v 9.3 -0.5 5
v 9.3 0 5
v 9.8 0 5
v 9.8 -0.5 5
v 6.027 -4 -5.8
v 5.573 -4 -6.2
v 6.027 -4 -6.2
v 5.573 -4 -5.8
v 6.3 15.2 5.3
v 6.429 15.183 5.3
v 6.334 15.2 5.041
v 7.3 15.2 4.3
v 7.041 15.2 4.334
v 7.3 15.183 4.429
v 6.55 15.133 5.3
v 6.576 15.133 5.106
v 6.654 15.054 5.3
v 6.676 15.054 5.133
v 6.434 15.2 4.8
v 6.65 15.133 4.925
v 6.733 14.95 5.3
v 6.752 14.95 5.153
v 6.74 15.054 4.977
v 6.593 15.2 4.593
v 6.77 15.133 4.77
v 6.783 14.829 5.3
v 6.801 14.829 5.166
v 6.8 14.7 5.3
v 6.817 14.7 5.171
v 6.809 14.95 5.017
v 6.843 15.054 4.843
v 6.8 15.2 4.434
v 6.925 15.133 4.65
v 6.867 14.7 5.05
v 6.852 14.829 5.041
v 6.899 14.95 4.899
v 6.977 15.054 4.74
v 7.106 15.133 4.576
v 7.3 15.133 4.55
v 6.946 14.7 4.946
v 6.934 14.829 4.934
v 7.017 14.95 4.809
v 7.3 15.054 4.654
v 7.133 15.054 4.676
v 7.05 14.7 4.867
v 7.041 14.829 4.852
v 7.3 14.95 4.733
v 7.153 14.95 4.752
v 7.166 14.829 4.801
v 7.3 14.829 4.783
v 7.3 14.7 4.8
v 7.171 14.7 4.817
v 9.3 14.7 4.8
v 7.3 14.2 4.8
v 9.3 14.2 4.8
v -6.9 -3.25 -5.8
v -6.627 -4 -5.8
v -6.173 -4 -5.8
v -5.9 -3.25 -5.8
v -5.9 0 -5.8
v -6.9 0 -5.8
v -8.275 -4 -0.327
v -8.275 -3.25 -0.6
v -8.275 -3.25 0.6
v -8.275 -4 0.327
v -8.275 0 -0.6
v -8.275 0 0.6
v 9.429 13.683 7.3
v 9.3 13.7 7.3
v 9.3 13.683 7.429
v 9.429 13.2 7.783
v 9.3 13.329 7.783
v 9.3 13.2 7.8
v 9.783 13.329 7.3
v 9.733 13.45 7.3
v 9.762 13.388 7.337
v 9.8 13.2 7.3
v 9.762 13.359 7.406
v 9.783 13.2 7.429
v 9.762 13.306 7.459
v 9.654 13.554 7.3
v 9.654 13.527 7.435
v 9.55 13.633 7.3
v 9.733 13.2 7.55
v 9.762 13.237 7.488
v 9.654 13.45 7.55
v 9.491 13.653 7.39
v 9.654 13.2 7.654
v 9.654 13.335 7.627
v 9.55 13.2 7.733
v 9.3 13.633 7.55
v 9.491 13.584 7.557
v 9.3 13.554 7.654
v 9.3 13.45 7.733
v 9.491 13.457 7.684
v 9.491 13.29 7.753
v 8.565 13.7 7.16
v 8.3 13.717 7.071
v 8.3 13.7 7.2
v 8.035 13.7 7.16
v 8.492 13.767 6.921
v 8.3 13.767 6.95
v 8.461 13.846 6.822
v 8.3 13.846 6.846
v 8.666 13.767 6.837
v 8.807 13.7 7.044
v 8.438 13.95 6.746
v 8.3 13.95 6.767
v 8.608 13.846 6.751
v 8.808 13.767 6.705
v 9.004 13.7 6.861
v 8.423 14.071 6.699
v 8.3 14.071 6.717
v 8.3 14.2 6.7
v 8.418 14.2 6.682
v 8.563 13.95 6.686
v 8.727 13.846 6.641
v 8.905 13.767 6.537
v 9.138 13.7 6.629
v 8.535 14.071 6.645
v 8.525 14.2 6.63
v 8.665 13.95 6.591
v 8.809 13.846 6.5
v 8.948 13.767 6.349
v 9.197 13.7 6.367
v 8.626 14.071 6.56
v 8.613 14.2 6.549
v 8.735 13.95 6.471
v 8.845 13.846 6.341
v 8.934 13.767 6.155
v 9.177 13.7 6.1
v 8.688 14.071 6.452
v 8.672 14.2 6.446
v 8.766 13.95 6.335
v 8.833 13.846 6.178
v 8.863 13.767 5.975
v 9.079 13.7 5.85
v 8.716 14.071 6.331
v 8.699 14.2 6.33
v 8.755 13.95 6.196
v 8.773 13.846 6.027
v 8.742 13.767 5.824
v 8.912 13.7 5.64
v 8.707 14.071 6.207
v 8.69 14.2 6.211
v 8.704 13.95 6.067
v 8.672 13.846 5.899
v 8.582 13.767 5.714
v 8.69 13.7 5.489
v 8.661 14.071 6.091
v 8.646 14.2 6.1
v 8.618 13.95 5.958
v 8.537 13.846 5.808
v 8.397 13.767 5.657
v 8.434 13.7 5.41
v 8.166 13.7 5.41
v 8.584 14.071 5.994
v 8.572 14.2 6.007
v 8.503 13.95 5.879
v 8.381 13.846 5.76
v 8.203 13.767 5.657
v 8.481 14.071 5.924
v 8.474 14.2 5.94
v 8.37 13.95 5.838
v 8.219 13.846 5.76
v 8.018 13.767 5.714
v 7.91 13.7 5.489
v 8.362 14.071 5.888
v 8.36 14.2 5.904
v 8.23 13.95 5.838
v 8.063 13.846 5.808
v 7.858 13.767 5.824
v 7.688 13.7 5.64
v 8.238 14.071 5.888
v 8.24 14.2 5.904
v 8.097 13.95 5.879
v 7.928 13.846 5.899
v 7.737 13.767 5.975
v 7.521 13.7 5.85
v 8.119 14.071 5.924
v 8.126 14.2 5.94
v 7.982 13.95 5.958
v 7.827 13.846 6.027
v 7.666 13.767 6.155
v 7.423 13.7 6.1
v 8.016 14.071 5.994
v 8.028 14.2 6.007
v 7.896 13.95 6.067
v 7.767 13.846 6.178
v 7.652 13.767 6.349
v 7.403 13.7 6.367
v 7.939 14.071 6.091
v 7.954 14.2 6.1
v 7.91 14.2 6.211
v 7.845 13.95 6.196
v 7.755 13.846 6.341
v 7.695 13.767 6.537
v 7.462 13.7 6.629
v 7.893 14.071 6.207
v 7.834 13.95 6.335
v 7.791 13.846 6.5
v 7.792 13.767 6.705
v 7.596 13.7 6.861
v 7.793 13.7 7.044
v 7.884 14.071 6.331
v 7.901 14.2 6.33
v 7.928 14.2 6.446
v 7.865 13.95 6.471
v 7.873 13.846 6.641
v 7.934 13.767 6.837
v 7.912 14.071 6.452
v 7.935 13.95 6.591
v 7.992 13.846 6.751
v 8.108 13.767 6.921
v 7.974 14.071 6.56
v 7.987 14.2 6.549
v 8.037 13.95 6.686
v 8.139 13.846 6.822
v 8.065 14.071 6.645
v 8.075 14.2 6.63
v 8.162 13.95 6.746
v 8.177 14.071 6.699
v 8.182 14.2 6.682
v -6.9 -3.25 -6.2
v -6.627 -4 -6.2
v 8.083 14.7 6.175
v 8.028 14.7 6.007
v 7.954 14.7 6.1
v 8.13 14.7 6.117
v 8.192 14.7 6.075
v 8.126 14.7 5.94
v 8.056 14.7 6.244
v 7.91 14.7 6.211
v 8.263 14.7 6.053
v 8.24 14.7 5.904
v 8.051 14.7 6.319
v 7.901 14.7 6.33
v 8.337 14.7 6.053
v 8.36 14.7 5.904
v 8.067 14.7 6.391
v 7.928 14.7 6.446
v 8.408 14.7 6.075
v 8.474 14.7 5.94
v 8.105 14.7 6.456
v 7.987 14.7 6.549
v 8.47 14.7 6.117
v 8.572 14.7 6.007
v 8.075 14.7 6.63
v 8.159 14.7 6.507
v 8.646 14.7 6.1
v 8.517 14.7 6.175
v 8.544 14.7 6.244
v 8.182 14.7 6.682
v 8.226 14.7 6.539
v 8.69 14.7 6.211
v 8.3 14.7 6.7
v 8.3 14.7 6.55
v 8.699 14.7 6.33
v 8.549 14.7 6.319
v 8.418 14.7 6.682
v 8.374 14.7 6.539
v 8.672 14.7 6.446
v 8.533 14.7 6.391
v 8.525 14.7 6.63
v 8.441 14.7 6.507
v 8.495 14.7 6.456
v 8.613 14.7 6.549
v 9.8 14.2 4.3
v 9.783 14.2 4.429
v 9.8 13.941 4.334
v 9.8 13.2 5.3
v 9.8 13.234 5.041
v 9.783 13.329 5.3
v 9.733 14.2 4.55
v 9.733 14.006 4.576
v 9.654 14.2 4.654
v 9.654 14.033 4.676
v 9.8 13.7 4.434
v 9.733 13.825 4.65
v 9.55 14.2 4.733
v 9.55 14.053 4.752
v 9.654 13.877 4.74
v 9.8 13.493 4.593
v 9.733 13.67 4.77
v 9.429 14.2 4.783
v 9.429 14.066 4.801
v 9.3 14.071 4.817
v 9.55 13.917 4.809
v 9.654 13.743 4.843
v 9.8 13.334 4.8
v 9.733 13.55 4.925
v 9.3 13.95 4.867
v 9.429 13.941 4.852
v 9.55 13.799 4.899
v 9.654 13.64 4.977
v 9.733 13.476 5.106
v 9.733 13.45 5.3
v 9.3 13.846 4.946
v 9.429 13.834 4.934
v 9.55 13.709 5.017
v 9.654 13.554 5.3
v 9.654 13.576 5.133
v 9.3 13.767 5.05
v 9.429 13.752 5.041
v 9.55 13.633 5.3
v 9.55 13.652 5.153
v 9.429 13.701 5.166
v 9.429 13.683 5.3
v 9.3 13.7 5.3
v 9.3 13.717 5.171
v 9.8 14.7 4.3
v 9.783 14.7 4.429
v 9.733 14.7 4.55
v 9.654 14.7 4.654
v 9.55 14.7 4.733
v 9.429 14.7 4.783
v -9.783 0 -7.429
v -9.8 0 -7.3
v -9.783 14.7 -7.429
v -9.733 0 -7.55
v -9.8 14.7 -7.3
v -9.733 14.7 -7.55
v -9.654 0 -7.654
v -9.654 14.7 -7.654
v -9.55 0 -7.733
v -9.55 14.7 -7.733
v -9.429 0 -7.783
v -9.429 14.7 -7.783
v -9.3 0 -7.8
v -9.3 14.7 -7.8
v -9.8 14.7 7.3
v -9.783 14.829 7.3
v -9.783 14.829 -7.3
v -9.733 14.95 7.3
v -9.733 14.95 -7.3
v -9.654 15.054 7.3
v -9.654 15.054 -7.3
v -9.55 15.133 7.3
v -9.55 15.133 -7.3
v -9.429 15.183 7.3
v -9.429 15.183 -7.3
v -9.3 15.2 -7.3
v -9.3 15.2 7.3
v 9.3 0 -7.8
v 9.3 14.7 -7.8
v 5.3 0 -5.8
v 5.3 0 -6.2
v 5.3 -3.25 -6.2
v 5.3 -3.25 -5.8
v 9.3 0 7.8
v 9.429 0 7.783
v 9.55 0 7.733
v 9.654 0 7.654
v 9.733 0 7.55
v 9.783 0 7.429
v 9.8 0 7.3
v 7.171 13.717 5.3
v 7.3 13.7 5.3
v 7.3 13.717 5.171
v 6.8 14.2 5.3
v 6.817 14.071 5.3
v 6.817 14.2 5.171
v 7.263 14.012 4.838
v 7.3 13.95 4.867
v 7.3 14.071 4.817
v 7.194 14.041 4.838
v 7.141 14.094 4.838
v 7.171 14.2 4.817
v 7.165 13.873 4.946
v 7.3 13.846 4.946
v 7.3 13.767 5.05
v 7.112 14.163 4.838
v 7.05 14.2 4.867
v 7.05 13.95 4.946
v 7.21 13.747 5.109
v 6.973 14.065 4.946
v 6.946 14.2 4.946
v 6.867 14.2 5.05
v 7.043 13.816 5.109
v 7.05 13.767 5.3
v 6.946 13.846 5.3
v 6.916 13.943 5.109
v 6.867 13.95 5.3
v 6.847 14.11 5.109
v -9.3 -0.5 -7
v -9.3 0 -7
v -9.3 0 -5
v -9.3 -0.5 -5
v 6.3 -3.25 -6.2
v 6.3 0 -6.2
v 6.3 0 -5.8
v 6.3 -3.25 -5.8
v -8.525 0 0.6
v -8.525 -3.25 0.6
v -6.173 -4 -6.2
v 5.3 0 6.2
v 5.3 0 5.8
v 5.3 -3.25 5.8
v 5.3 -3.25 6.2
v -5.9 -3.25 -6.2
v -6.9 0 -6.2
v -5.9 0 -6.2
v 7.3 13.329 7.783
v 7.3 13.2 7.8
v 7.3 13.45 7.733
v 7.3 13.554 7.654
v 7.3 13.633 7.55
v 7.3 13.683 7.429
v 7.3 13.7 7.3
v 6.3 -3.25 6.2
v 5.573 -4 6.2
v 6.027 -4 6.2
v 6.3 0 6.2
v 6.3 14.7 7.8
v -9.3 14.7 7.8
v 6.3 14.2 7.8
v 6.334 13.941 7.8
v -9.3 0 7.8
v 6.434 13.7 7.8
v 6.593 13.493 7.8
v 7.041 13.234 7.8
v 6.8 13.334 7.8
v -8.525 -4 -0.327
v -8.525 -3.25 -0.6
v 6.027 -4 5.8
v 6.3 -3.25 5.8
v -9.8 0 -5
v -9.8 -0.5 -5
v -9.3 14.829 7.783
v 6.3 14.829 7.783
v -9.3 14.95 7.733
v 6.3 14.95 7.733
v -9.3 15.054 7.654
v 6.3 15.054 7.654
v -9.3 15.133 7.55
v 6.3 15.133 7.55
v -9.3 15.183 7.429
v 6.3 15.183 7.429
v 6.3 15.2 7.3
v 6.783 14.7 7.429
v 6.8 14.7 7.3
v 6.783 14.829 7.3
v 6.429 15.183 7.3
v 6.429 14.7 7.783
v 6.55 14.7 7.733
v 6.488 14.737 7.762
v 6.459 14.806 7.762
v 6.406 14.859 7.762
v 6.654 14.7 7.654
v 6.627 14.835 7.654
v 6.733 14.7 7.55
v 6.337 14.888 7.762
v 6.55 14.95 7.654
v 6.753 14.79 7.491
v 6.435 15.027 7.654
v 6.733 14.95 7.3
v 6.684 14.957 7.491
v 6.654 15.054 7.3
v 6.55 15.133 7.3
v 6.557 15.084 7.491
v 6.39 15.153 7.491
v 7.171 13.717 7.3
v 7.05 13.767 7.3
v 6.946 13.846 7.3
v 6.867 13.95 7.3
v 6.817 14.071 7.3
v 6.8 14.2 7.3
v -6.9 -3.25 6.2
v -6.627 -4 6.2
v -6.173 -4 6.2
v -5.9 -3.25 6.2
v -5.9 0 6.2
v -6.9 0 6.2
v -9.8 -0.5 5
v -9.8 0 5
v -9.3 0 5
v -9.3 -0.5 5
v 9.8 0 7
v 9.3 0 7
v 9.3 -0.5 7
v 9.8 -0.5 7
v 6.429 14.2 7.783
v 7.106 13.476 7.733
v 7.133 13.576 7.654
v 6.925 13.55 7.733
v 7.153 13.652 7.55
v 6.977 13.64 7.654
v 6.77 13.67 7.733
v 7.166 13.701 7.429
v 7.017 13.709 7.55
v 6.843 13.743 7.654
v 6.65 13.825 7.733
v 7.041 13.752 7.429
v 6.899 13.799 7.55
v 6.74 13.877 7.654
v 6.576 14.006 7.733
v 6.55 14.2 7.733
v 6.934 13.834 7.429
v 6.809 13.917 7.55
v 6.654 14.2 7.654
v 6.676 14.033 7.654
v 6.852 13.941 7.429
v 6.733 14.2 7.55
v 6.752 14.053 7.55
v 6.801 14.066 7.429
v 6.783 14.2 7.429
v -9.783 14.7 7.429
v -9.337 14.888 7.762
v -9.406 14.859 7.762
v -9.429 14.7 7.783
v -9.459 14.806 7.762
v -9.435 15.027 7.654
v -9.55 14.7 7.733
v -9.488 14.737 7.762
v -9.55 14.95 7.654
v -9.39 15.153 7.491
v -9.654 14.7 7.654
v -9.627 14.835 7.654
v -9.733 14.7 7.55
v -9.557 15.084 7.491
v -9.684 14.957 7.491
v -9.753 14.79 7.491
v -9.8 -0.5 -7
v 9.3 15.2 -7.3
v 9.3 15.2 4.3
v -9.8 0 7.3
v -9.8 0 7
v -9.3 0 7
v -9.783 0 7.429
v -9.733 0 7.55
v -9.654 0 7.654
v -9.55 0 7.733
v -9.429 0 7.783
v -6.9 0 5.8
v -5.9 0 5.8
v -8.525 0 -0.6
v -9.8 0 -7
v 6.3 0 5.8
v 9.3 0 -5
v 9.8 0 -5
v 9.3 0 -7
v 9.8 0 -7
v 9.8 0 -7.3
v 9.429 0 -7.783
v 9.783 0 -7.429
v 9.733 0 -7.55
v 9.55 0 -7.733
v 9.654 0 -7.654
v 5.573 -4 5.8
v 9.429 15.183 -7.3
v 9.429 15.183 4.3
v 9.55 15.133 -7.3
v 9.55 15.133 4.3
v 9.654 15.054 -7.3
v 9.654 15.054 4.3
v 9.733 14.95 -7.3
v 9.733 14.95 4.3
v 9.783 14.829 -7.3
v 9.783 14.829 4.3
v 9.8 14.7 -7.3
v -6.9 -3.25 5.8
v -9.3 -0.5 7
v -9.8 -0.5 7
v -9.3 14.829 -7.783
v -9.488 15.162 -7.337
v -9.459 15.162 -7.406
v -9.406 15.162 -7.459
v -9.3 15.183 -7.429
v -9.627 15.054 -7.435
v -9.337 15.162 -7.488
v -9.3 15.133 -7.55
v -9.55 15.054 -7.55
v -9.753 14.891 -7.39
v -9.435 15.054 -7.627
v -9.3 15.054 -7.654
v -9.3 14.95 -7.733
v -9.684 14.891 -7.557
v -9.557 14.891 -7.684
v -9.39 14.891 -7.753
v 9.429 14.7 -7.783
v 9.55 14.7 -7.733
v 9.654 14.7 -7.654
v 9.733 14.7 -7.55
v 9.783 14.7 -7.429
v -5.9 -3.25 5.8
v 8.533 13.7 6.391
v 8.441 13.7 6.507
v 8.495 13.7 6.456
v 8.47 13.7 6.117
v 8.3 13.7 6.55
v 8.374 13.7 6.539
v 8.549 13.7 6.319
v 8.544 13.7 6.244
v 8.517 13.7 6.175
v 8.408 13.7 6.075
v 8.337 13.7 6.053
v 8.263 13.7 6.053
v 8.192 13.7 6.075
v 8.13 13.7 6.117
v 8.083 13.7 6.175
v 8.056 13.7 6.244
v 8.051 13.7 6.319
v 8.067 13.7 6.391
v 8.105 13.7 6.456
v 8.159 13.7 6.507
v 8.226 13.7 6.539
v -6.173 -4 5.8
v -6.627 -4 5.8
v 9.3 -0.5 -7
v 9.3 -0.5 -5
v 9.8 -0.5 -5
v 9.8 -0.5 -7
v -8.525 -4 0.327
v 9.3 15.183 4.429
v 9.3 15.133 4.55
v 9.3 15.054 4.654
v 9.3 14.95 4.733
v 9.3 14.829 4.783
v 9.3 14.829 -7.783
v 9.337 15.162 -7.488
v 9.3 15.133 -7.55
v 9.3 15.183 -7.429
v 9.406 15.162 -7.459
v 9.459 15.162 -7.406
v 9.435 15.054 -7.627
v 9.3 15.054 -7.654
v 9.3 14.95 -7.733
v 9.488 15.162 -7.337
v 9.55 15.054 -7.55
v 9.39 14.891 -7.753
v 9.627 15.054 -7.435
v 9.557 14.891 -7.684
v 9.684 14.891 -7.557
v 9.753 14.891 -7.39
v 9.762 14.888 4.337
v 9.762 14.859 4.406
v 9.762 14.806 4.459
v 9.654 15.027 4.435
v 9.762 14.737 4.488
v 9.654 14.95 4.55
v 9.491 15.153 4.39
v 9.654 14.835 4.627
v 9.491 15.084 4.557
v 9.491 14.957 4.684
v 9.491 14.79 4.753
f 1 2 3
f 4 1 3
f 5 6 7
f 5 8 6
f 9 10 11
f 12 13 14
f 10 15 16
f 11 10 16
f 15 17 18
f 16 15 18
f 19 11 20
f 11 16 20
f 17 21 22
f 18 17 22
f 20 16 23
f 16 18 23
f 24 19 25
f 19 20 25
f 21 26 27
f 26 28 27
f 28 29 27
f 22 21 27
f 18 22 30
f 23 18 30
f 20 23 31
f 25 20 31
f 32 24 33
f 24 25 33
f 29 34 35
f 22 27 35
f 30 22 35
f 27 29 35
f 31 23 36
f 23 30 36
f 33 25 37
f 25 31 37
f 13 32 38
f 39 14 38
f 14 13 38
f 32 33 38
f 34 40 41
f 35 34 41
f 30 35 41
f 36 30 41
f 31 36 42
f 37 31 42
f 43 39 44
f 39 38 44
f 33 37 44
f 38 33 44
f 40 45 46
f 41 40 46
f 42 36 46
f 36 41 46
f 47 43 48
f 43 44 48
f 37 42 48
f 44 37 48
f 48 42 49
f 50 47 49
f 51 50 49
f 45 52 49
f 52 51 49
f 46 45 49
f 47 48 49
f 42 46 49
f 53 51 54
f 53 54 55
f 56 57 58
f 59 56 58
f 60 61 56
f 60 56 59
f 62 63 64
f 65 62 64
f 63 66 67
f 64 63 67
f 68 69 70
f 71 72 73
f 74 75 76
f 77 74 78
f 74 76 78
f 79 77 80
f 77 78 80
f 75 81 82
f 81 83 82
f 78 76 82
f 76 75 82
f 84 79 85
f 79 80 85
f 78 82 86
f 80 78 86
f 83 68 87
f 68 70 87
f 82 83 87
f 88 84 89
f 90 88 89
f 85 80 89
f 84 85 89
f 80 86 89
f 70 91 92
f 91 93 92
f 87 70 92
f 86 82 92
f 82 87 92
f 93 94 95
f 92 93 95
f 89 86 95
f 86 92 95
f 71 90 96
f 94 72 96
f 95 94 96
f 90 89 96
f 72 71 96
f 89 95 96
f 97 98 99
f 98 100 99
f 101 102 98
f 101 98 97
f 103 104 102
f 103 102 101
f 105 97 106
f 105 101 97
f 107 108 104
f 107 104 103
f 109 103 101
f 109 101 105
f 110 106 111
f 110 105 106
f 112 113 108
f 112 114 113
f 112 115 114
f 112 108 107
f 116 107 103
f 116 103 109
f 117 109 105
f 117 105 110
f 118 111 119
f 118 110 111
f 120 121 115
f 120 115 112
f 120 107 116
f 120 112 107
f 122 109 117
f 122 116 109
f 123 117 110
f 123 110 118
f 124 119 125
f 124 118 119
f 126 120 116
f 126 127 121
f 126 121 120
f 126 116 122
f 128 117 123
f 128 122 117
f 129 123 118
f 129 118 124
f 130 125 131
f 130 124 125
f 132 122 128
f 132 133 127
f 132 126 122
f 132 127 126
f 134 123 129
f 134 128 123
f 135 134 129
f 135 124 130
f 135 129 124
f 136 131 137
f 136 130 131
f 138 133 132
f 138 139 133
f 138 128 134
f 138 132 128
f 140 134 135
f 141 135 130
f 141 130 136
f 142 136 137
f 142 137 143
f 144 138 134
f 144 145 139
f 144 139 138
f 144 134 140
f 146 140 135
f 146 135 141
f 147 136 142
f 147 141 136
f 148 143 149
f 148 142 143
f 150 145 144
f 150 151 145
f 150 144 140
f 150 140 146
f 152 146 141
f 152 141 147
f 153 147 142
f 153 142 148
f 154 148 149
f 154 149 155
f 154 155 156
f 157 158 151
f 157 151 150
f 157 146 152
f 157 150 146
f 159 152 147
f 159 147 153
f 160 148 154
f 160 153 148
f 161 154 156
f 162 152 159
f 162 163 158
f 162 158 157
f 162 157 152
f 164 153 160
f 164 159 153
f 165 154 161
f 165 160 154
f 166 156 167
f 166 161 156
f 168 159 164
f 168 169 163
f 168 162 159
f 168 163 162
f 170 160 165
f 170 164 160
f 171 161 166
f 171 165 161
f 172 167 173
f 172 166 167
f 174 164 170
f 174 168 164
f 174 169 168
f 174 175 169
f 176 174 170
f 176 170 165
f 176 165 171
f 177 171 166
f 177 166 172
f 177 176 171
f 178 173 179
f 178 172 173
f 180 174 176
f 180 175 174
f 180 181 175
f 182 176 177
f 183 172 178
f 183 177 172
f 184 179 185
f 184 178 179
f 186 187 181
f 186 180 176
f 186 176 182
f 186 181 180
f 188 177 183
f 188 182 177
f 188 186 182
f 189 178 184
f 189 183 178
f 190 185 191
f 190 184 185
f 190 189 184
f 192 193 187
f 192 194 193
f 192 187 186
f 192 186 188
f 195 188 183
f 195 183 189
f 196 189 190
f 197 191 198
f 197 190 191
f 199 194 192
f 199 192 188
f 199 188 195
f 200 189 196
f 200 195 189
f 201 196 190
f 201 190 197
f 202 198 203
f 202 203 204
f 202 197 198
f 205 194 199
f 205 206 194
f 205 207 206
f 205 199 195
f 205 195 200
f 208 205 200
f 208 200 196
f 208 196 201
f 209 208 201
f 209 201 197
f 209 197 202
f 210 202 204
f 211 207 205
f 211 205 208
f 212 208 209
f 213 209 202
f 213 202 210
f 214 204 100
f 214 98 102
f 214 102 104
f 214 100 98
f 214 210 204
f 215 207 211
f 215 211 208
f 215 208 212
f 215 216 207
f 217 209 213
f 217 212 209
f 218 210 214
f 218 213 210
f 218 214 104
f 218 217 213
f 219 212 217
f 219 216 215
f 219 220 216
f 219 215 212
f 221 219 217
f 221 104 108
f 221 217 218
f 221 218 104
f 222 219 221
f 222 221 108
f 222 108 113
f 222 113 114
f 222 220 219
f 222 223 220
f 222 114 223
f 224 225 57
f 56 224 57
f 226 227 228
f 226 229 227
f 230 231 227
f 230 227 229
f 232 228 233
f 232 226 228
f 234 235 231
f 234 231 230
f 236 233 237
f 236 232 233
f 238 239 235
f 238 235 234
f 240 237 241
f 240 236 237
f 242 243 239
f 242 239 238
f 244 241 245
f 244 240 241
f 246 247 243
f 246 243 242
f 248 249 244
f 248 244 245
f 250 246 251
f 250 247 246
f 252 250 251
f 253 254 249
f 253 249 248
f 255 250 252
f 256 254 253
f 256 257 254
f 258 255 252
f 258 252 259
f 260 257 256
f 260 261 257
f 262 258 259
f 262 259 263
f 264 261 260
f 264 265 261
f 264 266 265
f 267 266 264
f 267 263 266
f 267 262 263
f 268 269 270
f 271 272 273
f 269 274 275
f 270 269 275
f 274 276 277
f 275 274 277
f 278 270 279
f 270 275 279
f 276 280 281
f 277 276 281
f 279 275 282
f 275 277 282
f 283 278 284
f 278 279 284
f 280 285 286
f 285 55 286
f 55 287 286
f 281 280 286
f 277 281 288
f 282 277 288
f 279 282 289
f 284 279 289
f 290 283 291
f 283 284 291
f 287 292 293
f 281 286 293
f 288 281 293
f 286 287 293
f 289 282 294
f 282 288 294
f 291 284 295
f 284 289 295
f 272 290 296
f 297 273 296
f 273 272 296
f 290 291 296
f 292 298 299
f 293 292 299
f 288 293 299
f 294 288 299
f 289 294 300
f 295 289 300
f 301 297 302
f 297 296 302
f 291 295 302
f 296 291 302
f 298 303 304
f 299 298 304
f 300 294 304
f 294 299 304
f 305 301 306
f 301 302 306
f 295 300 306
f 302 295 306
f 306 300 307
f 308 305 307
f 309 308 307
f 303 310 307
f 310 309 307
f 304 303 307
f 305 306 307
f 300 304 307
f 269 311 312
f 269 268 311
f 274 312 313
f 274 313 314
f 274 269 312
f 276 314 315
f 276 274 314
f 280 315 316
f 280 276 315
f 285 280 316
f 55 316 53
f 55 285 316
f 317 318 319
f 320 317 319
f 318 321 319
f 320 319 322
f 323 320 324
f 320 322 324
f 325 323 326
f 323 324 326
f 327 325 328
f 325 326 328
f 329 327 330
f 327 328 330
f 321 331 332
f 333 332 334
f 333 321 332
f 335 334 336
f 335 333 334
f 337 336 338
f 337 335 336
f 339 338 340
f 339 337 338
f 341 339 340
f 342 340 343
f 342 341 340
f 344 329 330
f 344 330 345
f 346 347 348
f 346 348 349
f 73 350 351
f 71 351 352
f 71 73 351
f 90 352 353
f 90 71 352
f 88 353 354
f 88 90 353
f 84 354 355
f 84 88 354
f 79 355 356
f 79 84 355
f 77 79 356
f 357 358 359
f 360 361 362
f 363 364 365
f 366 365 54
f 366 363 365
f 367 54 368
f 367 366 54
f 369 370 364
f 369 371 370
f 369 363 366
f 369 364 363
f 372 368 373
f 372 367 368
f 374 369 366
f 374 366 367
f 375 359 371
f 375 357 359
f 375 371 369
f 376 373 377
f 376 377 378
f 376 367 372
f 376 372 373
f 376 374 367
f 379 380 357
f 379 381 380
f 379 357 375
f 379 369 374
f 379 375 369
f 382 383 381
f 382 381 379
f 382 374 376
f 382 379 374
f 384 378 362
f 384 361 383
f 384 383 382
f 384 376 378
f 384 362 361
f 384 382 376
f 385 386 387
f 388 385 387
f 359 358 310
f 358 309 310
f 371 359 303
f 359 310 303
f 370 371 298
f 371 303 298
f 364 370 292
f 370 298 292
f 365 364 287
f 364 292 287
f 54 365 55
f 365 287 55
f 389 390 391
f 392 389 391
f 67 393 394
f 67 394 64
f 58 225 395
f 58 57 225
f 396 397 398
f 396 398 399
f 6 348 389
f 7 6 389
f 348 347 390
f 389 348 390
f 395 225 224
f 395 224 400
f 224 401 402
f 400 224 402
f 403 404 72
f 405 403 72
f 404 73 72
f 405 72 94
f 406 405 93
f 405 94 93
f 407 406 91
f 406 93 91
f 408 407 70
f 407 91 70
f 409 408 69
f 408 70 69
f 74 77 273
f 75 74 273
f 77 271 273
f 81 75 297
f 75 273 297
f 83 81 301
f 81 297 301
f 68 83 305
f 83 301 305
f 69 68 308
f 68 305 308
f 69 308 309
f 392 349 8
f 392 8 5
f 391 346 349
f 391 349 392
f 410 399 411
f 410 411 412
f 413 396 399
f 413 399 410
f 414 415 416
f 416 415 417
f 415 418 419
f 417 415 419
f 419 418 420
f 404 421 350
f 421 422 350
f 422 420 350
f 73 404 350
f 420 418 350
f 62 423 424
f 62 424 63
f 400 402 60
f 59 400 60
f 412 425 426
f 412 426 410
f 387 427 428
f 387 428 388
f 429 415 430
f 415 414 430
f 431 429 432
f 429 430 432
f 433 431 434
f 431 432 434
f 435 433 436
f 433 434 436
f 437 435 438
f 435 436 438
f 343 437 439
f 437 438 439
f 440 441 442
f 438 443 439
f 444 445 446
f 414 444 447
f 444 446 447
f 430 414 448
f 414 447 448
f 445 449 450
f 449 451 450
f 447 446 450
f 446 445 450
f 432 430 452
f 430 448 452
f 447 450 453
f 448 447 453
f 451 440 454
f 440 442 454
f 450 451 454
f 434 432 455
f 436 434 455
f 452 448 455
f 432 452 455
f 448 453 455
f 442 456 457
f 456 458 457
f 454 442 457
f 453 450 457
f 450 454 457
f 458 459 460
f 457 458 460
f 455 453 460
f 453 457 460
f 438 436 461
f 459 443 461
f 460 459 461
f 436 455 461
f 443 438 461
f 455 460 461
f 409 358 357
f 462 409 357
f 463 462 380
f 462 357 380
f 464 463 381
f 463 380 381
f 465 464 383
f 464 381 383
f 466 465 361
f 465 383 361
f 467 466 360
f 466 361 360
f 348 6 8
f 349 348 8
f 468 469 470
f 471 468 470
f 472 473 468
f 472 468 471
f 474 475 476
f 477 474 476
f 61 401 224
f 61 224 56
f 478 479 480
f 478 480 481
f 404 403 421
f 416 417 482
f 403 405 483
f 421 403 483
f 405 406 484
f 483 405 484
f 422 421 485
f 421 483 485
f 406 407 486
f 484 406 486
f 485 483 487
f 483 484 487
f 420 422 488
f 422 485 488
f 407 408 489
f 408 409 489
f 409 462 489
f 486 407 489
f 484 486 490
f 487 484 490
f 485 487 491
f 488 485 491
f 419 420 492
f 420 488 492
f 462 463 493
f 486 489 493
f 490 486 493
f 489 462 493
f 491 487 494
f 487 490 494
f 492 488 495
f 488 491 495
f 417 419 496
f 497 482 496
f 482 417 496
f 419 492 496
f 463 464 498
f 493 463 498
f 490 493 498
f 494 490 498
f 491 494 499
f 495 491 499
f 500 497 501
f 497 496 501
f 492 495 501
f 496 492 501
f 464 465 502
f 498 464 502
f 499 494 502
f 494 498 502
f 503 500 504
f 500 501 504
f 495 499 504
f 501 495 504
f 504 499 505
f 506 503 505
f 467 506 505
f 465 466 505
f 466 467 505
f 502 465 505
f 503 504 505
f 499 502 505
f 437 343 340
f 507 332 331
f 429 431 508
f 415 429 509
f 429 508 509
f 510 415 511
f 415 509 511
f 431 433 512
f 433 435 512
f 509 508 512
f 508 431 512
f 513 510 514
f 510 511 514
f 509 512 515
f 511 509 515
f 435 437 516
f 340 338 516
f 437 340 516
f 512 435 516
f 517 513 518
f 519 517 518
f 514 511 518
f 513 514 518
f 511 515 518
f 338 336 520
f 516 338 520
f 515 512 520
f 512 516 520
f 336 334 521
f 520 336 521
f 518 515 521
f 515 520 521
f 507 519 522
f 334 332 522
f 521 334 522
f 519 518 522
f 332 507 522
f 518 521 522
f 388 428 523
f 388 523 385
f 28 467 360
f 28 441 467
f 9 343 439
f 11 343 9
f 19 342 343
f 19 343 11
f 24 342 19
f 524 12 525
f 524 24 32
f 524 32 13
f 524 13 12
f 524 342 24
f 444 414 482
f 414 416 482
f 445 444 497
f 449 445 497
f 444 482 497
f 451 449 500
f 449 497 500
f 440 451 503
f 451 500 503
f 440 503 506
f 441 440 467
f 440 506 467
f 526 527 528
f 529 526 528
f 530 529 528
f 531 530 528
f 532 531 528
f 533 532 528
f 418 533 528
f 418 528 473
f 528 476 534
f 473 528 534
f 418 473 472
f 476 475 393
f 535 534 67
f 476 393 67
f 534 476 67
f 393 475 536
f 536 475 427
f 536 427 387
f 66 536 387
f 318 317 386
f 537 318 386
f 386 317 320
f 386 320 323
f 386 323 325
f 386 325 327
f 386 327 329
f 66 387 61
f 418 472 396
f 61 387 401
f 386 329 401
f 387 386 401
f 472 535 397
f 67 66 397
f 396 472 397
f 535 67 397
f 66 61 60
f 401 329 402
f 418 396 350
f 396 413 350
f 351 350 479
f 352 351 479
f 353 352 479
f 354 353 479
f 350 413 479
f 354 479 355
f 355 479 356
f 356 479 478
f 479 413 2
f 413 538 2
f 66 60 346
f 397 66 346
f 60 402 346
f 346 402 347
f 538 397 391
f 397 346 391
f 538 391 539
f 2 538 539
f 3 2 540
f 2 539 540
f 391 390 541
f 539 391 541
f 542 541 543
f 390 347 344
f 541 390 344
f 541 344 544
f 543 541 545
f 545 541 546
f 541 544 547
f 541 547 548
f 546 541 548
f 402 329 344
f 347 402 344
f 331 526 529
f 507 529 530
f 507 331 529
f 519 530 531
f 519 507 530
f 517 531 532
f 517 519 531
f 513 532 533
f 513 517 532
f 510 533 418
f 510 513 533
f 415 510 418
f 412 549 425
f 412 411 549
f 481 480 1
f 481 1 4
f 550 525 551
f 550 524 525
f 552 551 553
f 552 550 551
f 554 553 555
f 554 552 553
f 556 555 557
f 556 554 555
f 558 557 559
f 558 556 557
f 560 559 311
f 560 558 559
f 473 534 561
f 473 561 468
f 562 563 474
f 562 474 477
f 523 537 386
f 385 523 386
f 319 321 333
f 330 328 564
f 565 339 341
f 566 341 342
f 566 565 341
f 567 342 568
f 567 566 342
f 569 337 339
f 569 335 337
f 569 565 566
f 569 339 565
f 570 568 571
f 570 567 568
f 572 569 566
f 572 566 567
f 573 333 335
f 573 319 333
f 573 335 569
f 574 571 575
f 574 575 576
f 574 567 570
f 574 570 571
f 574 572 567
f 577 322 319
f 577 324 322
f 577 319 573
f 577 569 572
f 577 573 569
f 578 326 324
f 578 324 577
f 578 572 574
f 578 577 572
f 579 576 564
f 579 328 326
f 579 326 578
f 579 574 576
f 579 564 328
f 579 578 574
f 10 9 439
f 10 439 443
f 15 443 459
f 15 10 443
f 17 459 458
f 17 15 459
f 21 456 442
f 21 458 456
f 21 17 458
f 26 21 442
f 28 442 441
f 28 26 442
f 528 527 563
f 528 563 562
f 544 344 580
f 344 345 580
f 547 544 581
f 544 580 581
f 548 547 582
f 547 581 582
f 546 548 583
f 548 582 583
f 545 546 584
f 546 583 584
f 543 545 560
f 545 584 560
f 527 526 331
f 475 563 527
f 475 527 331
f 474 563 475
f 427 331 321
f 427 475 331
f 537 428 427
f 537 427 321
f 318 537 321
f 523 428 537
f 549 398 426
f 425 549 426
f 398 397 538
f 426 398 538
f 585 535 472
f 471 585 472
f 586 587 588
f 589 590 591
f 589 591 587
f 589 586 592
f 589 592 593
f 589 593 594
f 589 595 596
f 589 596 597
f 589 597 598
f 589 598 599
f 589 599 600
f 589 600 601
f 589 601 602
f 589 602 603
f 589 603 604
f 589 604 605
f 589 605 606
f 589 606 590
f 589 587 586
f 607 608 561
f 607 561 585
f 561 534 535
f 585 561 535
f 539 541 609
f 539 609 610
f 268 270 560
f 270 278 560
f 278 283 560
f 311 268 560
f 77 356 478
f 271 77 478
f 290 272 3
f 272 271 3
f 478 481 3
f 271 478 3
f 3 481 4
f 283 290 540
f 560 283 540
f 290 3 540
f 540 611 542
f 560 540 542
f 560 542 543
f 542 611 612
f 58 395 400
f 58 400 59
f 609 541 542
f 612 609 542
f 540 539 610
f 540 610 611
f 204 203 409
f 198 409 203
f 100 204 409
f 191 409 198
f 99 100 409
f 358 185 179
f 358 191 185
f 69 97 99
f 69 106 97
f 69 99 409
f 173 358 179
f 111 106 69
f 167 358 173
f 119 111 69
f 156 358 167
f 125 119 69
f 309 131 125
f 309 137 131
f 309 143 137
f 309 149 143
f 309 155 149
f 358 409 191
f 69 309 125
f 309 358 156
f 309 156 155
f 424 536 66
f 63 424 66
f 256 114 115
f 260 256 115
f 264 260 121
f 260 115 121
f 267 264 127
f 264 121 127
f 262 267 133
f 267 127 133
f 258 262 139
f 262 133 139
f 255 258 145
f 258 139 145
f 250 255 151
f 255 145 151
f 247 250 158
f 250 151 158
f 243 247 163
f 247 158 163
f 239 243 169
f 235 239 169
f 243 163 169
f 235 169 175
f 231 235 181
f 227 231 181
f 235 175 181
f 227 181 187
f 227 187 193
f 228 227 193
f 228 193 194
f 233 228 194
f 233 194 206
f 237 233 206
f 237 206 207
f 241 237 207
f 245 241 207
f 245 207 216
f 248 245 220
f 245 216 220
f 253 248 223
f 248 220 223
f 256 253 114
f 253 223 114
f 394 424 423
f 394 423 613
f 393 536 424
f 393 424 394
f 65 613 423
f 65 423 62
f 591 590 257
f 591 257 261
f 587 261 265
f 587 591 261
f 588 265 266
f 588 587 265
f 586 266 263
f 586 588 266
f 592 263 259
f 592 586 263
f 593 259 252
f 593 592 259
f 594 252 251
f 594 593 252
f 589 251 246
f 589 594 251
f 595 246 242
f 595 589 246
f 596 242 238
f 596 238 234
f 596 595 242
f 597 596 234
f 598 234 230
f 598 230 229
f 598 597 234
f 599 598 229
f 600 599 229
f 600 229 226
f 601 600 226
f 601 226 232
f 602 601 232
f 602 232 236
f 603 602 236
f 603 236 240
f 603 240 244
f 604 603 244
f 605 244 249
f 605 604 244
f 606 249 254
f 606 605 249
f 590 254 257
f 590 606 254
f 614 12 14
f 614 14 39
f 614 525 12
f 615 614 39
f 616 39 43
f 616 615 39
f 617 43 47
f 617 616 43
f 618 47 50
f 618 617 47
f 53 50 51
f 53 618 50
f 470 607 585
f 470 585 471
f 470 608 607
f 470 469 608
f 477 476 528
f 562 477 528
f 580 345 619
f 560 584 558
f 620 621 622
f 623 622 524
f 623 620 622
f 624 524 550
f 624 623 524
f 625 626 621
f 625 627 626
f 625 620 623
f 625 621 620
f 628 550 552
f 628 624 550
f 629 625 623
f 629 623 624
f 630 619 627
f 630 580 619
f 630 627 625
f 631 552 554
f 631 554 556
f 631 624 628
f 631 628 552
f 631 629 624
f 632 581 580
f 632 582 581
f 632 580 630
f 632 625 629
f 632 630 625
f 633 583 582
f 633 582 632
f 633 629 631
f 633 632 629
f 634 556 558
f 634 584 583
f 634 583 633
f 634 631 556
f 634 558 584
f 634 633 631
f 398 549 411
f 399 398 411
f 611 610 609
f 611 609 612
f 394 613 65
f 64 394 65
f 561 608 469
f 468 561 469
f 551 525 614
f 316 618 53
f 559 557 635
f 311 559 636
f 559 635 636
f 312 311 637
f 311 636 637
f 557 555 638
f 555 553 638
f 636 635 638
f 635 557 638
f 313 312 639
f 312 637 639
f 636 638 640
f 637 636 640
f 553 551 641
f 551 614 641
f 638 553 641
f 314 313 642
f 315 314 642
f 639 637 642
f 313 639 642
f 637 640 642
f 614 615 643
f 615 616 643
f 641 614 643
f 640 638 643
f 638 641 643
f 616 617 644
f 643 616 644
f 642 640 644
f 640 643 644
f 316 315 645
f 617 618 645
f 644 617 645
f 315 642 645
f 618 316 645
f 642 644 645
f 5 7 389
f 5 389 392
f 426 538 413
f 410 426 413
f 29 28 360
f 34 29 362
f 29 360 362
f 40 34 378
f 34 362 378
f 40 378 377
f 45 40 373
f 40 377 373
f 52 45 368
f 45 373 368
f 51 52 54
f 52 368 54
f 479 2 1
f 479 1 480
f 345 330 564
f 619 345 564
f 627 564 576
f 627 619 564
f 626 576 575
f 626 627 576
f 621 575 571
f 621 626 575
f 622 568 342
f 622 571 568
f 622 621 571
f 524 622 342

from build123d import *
from OCP.BRepFilletAPI import BRepFilletAPI_MakeChamfer

# Parameters (mm, degrees)
SKETCH_1_W          = 19.6
SKETCH_1_H          = 15.6
EXTRUDE_1_DEPTH     = 15.2
SKETCH_2_W          = 3
SKETCH_2_H          = 3
CUT_EXTRUDE_1_DEPTH = 1.5
SKETCH_3_R          = 0.4
SKETCH_3_R_2        = 0.25
EXTRUDE_2_DEPTH     = 1
SKETCH_5_W          = 0.5
SKETCH_5_H          = 2
EXTRUDE_4_DEPTH     = 0.5
FILLET_1_R          = 0.5
SKETCH_4_W          = 0.25
SKETCH_4_H          = 1.2
SKETCH_4_W_2        = 1
SKETCH_4_H_2        = 0.4
EXTRUDE_3_DEPTH     = 4
CHAMFER_1_SIZE      = 0.75
CHAMFER_1_SIZE2     = 0.272977676


with BuildPart() as part:
    # Эскиз1 → Бобышка-Вытянуть1 (new body)
    with BuildSketch(Plane(origin=(0, 0, 0), x_dir=(1, 0, 0), z_dir=(0, 1, 0))):
        Rectangle(SKETCH_1_W, SKETCH_1_H)
    extrude(amount=EXTRUDE_1_DEPTH)

    # Эскиз2 → Вырез-Вытянуть1 (cut)
    with BuildSketch(Plane(origin=(0, 15.2, 0), x_dir=(1, 0, 0), z_dir=(0, 1, 0))):
        with Locations((8.3, -6.3)):
            Rectangle(SKETCH_2_W, SKETCH_2_H)
    extrude(amount=-CUT_EXTRUDE_1_DEPTH, mode=Mode.SUBTRACT)

    # Эскиз3 → Бобышка-Вытянуть2 (add)
    with BuildSketch(Plane(origin=(0, 13.7, 0), x_dir=(1, 0, 0), z_dir=(0, 1, 0))):
        with Locations(Location((8.3, -6.3, 0), (0, 0, 270))):
            Circle(SKETCH_3_R)
        with Locations(Location((8.3, -6.3, 0), (0, 0, 270))):
            Circle(SKETCH_3_R_2, mode=Mode.SUBTRACT)
    extrude(amount=EXTRUDE_2_DEPTH)

    # Эскиз5 → Бобышка-Вытянуть4 (add)
    with BuildSketch(Plane.XZ):
        with Locations((-9.55, 6)):
            Rectangle(SKETCH_5_W, SKETCH_5_H)
        with Locations((-9.55, -6)):
            Rectangle(SKETCH_5_W, SKETCH_5_H)
        with Locations((9.55, -6)):
            Rectangle(SKETCH_5_W, SKETCH_5_H)
        with Locations((9.55, 6)):
            Rectangle(SKETCH_5_W, SKETCH_5_H)
    extrude(amount=EXTRUDE_4_DEPTH)

    # Скругление1
    fillet_1_edges = [part.edges().sort_by_distance(p)[0] for p in [
        (8.3, 15.2, 4.8),
        (-9.8, 7.6, -7.8),
        (-9.8, 15.2, 0),
        (9.8, 7.6, -7.8),
        (0, 15.2, -7.8),
        (9.8, 15.2, -1.5),
        (8.3, 13.7, 5.9),
        (6.8, 13.7, 6.3),
        (8.3, 13.7, 4.8),
        (9.8, 14.45, 4.8),
        (8.3, 13.7, 7.8),
        (9.8, 13.7, 6.3),
        (6.8, 14.45, 4.8),
        (6.8, 15.2, 6.3),
        (6.8, 14.45, 7.8),
        (-1.5, 15.2, 7.8),
        (9.8, 6.85, 7.8),
        (-9.8, 7.6, 7.8),
    ]]
    fillet(fillet_1_edges, radius=FILLET_1_R)

    # Эскиз4 → Бобышка-Вытянуть3 (add)
    with BuildSketch(Plane.XZ):
        with Locations((-8.4, 0)):
            Rectangle(SKETCH_4_W, SKETCH_4_H)
        with Locations((-6.4, 6)):
            Rectangle(SKETCH_4_W_2, SKETCH_4_H_2)
        with Locations((5.8, 6)):
            Rectangle(SKETCH_4_W_2, SKETCH_4_H_2)
        with Locations((5.8, -6)):
            Rectangle(SKETCH_4_W_2, SKETCH_4_H_2)
        with Locations((-6.4, -6)):
            Rectangle(SKETCH_4_W_2, SKETCH_4_H_2)
    extrude(amount=EXTRUDE_3_DEPTH)

    # Фаска1: one chamfer whose edges measure the first distance from different faces: ONE call of the kernel's chamfer builder (chamfer() names one face for all edges)
    chamfer_1_edges_1 = [part.edges().sort_by_distance(p)[0] for p in [
        (-8.4, -4, 0.6),
    ]]
    chamfer_1_side_1 = [part.faces().sort_by_distance(p)[0] for p in [
        (-8.4, -2, 0.6),
    ]]
    chamfer_1_edges_2 = [part.edges().sort_by_distance(p)[0] for p in [
        (-8.4, -4, -0.6),
    ]]
    chamfer_1_side_2 = [part.faces().sort_by_distance(p)[0] for p in [
        (-8.4, -2, -0.6),
    ]]
    chamfer_1_edges_3 = [part.edges().sort_by_distance(p)[0] for p in [
        (-6.9, -4, 6),
    ]]
    chamfer_1_side_3 = [part.faces().sort_by_distance(p)[0] for p in [
        (-6.9, -2, 6),
    ]]
    chamfer_1_edges_4 = [part.edges().sort_by_distance(p)[0] for p in [
        (-5.9, -4, 6),
    ]]
    chamfer_1_side_4 = [part.faces().sort_by_distance(p)[0] for p in [
        (-5.9, -2, 6),
    ]]
    chamfer_1_edges_5 = [part.edges().sort_by_distance(p)[0] for p in [
        (5.3, -4, 6),
    ]]
    chamfer_1_side_5 = [part.faces().sort_by_distance(p)[0] for p in [
        (5.3, -2, 6),
    ]]
    chamfer_1_edges_6 = [part.edges().sort_by_distance(p)[0] for p in [
        (6.3, -4, 6),
    ]]
    chamfer_1_side_6 = [part.faces().sort_by_distance(p)[0] for p in [
        (6.3, -2, 6),
    ]]
    chamfer_1_edges_7 = [part.edges().sort_by_distance(p)[0] for p in [
        (6.3, -4, -6),
    ]]
    chamfer_1_side_7 = [part.faces().sort_by_distance(p)[0] for p in [
        (6.3, -2, -6),
    ]]
    chamfer_1_edges_8 = [part.edges().sort_by_distance(p)[0] for p in [
        (5.3, -4, -6),
    ]]
    chamfer_1_side_8 = [part.faces().sort_by_distance(p)[0] for p in [
        (5.3, -2, -6),
    ]]
    chamfer_1_edges_9 = [part.edges().sort_by_distance(p)[0] for p in [
        (-5.9, -4, -6),
    ]]
    chamfer_1_side_9 = [part.faces().sort_by_distance(p)[0] for p in [
        (-5.9, -2, -6),
    ]]
    chamfer_1_edges_10 = [part.edges().sort_by_distance(p)[0] for p in [
        (-6.9, -4, -6),
    ]]
    chamfer_1_side_10 = [part.faces().sort_by_distance(p)[0] for p in [
        (-6.9, -2, -6),
    ]]
    chamfer_1 = BRepFilletAPI_MakeChamfer(part.part.solid().wrapped)
    for e in chamfer_1_edges_1:
        chamfer_1.Add(CHAMFER_1_SIZE, CHAMFER_1_SIZE2, e.wrapped, chamfer_1_side_1[0].wrapped)  # the first distance lies on this face
    for e in chamfer_1_edges_2:
        chamfer_1.Add(CHAMFER_1_SIZE, CHAMFER_1_SIZE2, e.wrapped, chamfer_1_side_2[0].wrapped)  # the first distance lies on this face
    for e in chamfer_1_edges_3:
        chamfer_1.Add(CHAMFER_1_SIZE, CHAMFER_1_SIZE2, e.wrapped, chamfer_1_side_3[0].wrapped)  # the first distance lies on this face
    for e in chamfer_1_edges_4:
        chamfer_1.Add(CHAMFER_1_SIZE, CHAMFER_1_SIZE2, e.wrapped, chamfer_1_side_4[0].wrapped)  # the first distance lies on this face
    for e in chamfer_1_edges_5:
        chamfer_1.Add(CHAMFER_1_SIZE, CHAMFER_1_SIZE2, e.wrapped, chamfer_1_side_5[0].wrapped)  # the first distance lies on this face
    for e in chamfer_1_edges_6:
        chamfer_1.Add(CHAMFER_1_SIZE, CHAMFER_1_SIZE2, e.wrapped, chamfer_1_side_6[0].wrapped)  # the first distance lies on this face
    for e in chamfer_1_edges_7:
        chamfer_1.Add(CHAMFER_1_SIZE, CHAMFER_1_SIZE2, e.wrapped, chamfer_1_side_7[0].wrapped)  # the first distance lies on this face
    for e in chamfer_1_edges_8:
        chamfer_1.Add(CHAMFER_1_SIZE, CHAMFER_1_SIZE2, e.wrapped, chamfer_1_side_8[0].wrapped)  # the first distance lies on this face
    for e in chamfer_1_edges_9:
        chamfer_1.Add(CHAMFER_1_SIZE, CHAMFER_1_SIZE2, e.wrapped, chamfer_1_side_9[0].wrapped)  # the first distance lies on this face
    for e in chamfer_1_edges_10:
        chamfer_1.Add(CHAMFER_1_SIZE, CHAMFER_1_SIZE2, e.wrapped, chamfer_1_side_10[0].wrapped)  # the first distance lies on this face
    add(Compound.cast(chamfer_1.Shape()), mode=Mode.REPLACE)


solid = part.part
